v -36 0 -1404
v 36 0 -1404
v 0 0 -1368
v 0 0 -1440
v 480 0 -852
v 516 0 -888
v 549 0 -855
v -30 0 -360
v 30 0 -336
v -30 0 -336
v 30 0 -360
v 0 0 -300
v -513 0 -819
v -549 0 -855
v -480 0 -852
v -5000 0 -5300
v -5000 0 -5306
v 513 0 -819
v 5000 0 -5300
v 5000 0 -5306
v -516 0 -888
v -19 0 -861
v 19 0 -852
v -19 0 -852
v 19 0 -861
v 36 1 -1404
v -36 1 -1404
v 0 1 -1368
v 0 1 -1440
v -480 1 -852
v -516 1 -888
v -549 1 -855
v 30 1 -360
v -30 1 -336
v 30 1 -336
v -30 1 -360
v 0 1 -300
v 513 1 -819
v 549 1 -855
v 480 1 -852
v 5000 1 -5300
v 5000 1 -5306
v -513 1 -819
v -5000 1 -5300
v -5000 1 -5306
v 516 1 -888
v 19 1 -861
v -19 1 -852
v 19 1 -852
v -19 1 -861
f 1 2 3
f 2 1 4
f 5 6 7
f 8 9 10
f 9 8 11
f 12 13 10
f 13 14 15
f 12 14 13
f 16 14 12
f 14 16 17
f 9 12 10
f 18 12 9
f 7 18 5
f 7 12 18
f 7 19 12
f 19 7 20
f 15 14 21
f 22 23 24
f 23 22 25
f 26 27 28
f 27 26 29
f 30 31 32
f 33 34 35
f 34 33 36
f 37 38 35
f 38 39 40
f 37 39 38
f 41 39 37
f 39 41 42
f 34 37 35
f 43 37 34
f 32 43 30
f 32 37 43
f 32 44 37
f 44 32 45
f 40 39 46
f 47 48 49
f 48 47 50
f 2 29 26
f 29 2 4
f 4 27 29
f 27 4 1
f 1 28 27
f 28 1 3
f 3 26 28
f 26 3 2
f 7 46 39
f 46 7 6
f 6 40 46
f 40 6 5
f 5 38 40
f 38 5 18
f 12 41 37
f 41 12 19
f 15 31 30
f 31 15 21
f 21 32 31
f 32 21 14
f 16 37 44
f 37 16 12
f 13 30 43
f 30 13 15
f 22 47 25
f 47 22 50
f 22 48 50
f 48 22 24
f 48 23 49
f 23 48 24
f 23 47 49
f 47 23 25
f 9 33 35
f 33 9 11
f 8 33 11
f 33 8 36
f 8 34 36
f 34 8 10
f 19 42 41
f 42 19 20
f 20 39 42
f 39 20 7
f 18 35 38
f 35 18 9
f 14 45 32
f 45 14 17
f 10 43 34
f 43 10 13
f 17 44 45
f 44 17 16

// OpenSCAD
$fs = 120;

$vpt = [0,1080,480];
$vpr = [-34,0,0];
$vpf = 45;

foul_line = 6;
plain_color = [1,1,1,0.8];
out_color = [1,0.75,0.75,0.8];
eat_color = [0.5,0.75,1,0.8];

// home, first, second, third, rubber
color([1,1,1]) scale([1,-1,-1]) rotate([90,0,0]) linear_extrude(1) {
    polygon([[-30,30*2+300],[30,30*2+300],[30,30+300],[0,300],[-30,30+300]]);
    polygon([[552-36*2,852],[552-36,852+36],[552,852],[552-36,852-36]]);
    polygon([[0,1404+36],[36,1404],[0,1404-36],[-36,1404]]);
    polygon([[-552+36*2,852],[-552+36,852+36],[-552,852],[-552+36,852-36]]);
    polygon([[-19,852],[19,852],[19,9+852],[-19,9+852]]);
}

// foul lines
color([1,1,1,0.5]) scale([1,-1,-1]) rotate([90,0,0]) linear_extrude(1) {
    polygon([[0,300],[-5000,300+5000],[-5000,300+5000+foul_line],[0,300+foul_line]]);
    polygon([[0,300],[5000,300+5000],[5000,300+5000+foul_line],[0,300+foul_line]]);
}

scale([0.1,0.1,-0.1]) translate([-23200,0,0]) {
    color(out_color) polyhedron([[12210,0,14230],[11910,0,22050],[12210,100,14230],[11910,100,22050]], [[0,1,3,2]]);
    color(out_color) polyhedron([[12210,0,14230],[11000,0,14160],[12210,100,14230],[11000,500,14160]], [[0,1,3,2]]);
    color(out_color) polyhedron([[11910,0,22050],[10890,0,22710],[11910,100,22050],[10890,500,22710]], [[0,1,3,2]]);
    color(out_color) polyhedron([[11000,0,14160],[10890,0,22710],[11000,500,14160],[10890,500,22710]], [[0,1,3,2]]);
    color(out_color) polyhedron([[12210,100,14230],[11000,500,14160],[11910,100,22050],[10890,500,22710]], [[0,1,3,2]]);
    color(out_color) polyhedron([[11170,0,19010],[11120,0,21410],[11170,700,19010],[11120,700,21410]], [[0,1,3,2]]);
    color(out_color) polyhedron([[11170,0,19010],[9360,0,19120],[11170,700,19010],[9360,700,19120]], [[0,1,3,2]]);
    color(out_color) polyhedron([[11120,0,21410],[9510,0,21690],[11120,700,21410],[9510,700,21690]], [[0,1,3,2]]);
    color(out_color) polyhedron([[9360,0,19120],[9510,0,21690],[9360,700,19120],[9510,700,21690]], [[0,1,3,2]]);
    color(out_color) polyhedron([[11170,700,19010],[9360,700,19120],[11120,700,21410],[9510,700,21690]], [[0,1,3,2]]);
    color(out_color) polyhedron([[11120,0,21410],[12230,0,25450],[11120,100,21410],[12230,100,25450]], [[0,1,3,2]]);
    color(out_color) polyhedron([[11120,0,21410],[9510,0,21690],[11120,100,21410],[9510,500,21690]], [[0,1,3,2]]);
    color(out_color) polyhedron([[12230,0,25450],[11590,0,26090],[12230,100,25450],[11590,500,26090]], [[0,1,3,2]]);
    color(out_color) polyhedron([[9510,0,21690],[11590,0,26090],[9510,500,21690],[11590,500,26090]], [[0,1,3,2]]);
    color(out_color) polyhedron([[11120,100,21410],[9510,500,21690],[12230,100,25450],[11590,500,26090]], [[0,1,3,2]]);
    color(eat_color) polyhedron([[9630,0,24090],[18040,0,31780],[9630,5,24090],[18040,5,31780]], [[0,1,3,2]]);
    color(eat_color) polyhedron([[9630,0,24090],[7580,0,25450],[9630,5,24090],[7580,5,25450]], [[0,1,3,2]]);
    color(eat_color) polyhedron([[18040,0,31780],[16620,0,34170],[18040,5,31780],[16620,5,34170]], [[0,1,3,2]]);
    color(eat_color) polyhedron([[7580,0,25450],[16620,0,34170],[7580,5,25450],[16620,5,34170]], [[0,1,3,2]]);
    color(eat_color) polyhedron([[9630,5,24090],[7580,5,25450],[18040,5,31780],[16620,5,34170]], [[0,1,3,2]]);
    color(out_color) polyhedron([[8270,0,33280],[17030,0,42150],[8270,10000,33280],[17030,10000,42150]], [[0,1,3,2]]);
    color(out_color) polyhedron([[8270,0,33280],[300,0,41920],[8270,10000,33280],[300,10000,41920]], [[0,1,3,2]]);
    color(out_color) polyhedron([[17030,0,42150],[17030,0,43000],[17030,10000,42150],[17030,10000,43000]], [[0,1,3,2]]);
    color(out_color) polyhedron([[300,0,41920],[17030,0,43000],[300,10000,41920],[17030,10000,43000]], [[0,1,3,2]]);
    color(out_color) polyhedron([[8270,10000,33280],[300,10000,41920],[17030,10000,42150],[17030,10000,43000]], [[0,1,3,2]]);
    color(eat_color) polyhedron([[33670,0,38400],[39560,0,24210],[33670,5,38400],[39560,5,24210]], [[0,1,3,2]]);
    color(eat_color) polyhedron([[33670,0,38400],[37040,0,42380],[33670,5,38400],[37040,5,42380]], [[0,1,3,2]]);
    color(eat_color) polyhedron([[39560,0,24210],[42580,0,32440],[39560,5,24210],[42580,5,32440]], [[0,1,3,2]]);
    color(eat_color) polyhedron([[37040,0,42380],[42580,0,32440],[37040,5,42380],[42580,5,32440]], [[0,1,3,2]]);
    color(eat_color) polyhedron([[33670,5,38400],[37040,5,42380],[39560,5,24210],[42580,5,32440]], [[0,1,3,2]]);
    color(out_color) polyhedron([[35780,0,24940],[37920,0,19780],[35780,500,24940],[37920,500,19780]], [[0,1,3,2]]);
    color(out_color) polyhedron([[35780,0,24940],[38900,0,27150],[35780,500,24940],[38900,1000,27150]], [[0,1,3,2]]);
    color(out_color) polyhedron([[37920,0,19780],[38450,0,23860],[37920,500,19780],[38450,1000,23860]], [[0,1,3,2]]);
    color(out_color) polyhedron([[38900,0,27150],[38450,0,23860],[38900,1000,27150],[38450,1000,23860]], [[0,1,3,2]]);
    color(out_color) polyhedron([[35780,500,24940],[38900,1000,27150],[37920,500,19780],[38450,1000,23860]], [[0,1,3,2]]);
    color(out_color) polyhedron([[28620,0,3330],[29110,0,2760],[28620,500,3330],[29110,500,2760]], [[0,1,3,2]]);
    color(out_color) polyhedron([[28620,0,3330],[32730,0,8510],[28620,500,3330],[32730,1000,8510]], [[0,1,3,2]]);
    color(out_color) polyhedron([[29110,0,2760],[33290,0,6930],[29110,500,2760],[33290,1000,6930]], [[0,1,3,2]]);
    color(out_color) polyhedron([[32730,0,8510],[33290,0,6930],[32730,1000,8510],[33290,1000,6930]], [[0,1,3,2]]);
    color(out_color) polyhedron([[28620,500,3330],[32730,1000,8510],[29110,500,2760],[33290,1000,6930]], [[0,1,3,2]]);
    color(out_color) polyhedron([[28890,0,1880],[29110,0,2760],[28890,5,1880],[29110,5,2760]], [[0,1,3,2]]);
    color(out_color) polyhedron([[28890,0,1880],[28990,0,1880],[28890,5,1880],[28990,5,1880]], [[0,1,3,2]]);
    color(out_color) polyhedron([[29110,0,2760],[29210,0,2760],[29110,5,2760],[29210,5,2760]], [[0,1,3,2]]);
    color(out_color) polyhedron([[28990,0,1880],[29210,0,2760],[28990,5,1880],[29210,5,2760]], [[0,1,3,2]]);
    color(out_color) polyhedron([[28890,5,1880],[28990,5,1880],[29110,5,2760],[29210,5,2760]], [[0,1,3,2]]);
    color(out_color) polyhedron([[13960,0,4590],[18500,0,4590],[13960,5,4590],[18500,5,4590]], [[0,1,3,2]]);
    color(out_color) polyhedron([[13960,0,4590],[13960,0,4690],[13960,5,4590],[13960,5,4690]], [[0,1,3,2]]);
    color(out_color) polyhedron([[18500,0,4590],[18500,0,4690],[18500,5,4590],[18500,5,4690]], [[0,1,3,2]]);
    color(out_color) polyhedron([[13960,0,4690],[18500,0,4690],[13960,5,4690],[18500,5,4690]], [[0,1,3,2]]);
    color(out_color) polyhedron([[13960,5,4590],[13960,5,4690],[18500,5,4590],[18500,5,4690]], [[0,1,3,2]]);
    color(out_color) polyhedron([[19090,0,1880],[19190,0,1880],[19090,5,1880],[19190,5,1880]], [[0,1,3,2]]);
    color(out_color) polyhedron([[19090,0,1880],[18500,0,4560],[19090,5,1880],[18500,5,4560]], [[0,1,3,2]]);
    color(out_color) polyhedron([[19190,0,1880],[18600,0,4560],[19190,5,1880],[18600,5,4560]], [[0,1,3,2]]);
    color(out_color) polyhedron([[18500,0,4560],[18600,0,4560],[18500,5,4560],[18600,5,4560]], [[0,1,3,2]]);
    color(out_color) polyhedron([[19090,5,1880],[18500,5,4560],[19190,5,1880],[18600,5,4560]], [[0,1,3,2]]);
    color(out_color) polyhedron([[10420,0,14090],[11000,0,14160],[10420,5,14090],[11000,5,14160]], [[0,1,3,2]]);
    color(out_color) polyhedron([[10420,0,14090],[10420,0,14190],[10420,5,14090],[10420,5,14190]], [[0,1,3,2]]);
    color(out_color) polyhedron([[11000,0,14160],[11000,0,14260],[11000,5,14160],[11000,5,14260]], [[0,1,3,2]]);
    color(out_color) polyhedron([[10420,0,14190],[11000,0,14260],[10420,5,14190],[11000,5,14260]], [[0,1,3,2]]);
    color(out_color) polyhedron([[10420,5,14090],[10420,5,14190],[11000,5,14160],[11000,5,14260]], [[0,1,3,2]]);
    color(out_color) polyhedron([[18040,0,31780],[28960,0,42380],[18040,5,31780],[28960,5,42380]], [[0,1,3,2]]);
    color(out_color) polyhedron([[18040,0,31780],[18040,0,31880],[18040,5,31780],[18040,5,31880]], [[0,1,3,2]]);
    color(out_color) polyhedron([[28960,0,42380],[28960,0,42480],[28960,5,42380],[28960,5,42480]], [[0,1,3,2]]);
    color(out_color) polyhedron([[18040,0,31880],[28960,0,42480],[18040,5,31880],[28960,5,42480]], [[0,1,3,2]]);
    color(out_color) polyhedron([[18040,5,31780],[18040,5,31880],[28960,5,42380],[28960,5,42480]], [[0,1,3,2]]);
    color(out_color) polyhedron([[28960,0,42380],[33670,0,38400],[28960,5,42380],[33670,5,38400]], [[0,1,3,2]]);
    color(out_color) polyhedron([[28960,0,42380],[28960,0,42480],[28960,5,42380],[28960,5,42480]], [[0,1,3,2]]);
    color(out_color) polyhedron([[33670,0,38400],[33670,0,38500],[33670,5,38400],[33670,5,38500]], [[0,1,3,2]]);
    color(out_color) polyhedron([[28960,0,42480],[33670,0,38500],[28960,5,42480],[33670,5,38500]], [[0,1,3,2]]);
    color(out_color) polyhedron([[28960,5,42380],[28960,5,42480],[33670,5,38400],[33670,5,38500]], [[0,1,3,2]]);
    color(plain_color) polyhedron([[0,0,0],[0,0,0],[0,0,0],[0,0,0]], [[0,1,3,2]]);
    color(plain_color) polyhedron([[0,0,0],[0,0,0],[0,0,0],[0,0,0]], [[0,1,3,2]]);
    color(plain_color) polyhedron([[0,0,0],[0,0,0],[0,0,0],[0,0,0]], [[0,1,3,2]]);
    color(plain_color) polyhedron([[0,0,0],[0,0,0],[0,0,0],[0,0,0]], [[0,1,3,2]]);
    color(plain_color) polyhedron([[0,0,0],[0,0,0],[0,0,0],[0,0,0]], [[0,1,3,2]]);
    color(plain_color) polyhedron([[0,0,0],[0,0,0],[0,0,0],[0,0,0]], [[0,1,3,2]]);
    color(plain_color) polyhedron([[0,0,0],[0,0,0],[0,0,0],[0,0,0]], [[0,1,3,2]]);
    color(plain_color) polyhedron([[0,0,0],[0,0,0],[0,0,0],[0,0,0]], [[0,1,3,2]]);
    color(plain_color) polyhedron([[0,0,0],[0,0,0],[0,0,0],[0,0,0]], [[0,1,3,2]]);
    color(plain_color) polyhedron([[0,0,0],[0,0,0],[0,0,0],[0,0,0]], [[0,1,3,2]]);
    color(plain_color) polyhedron([[0,0,0],[0,0,0],[0,0,0],[0,0,0]], [[0,1,3,2]]);
    color(plain_color) polyhedron([[0,0,0],[0,0,0],[0,0,0],[0,0,0]], [[0,1,3,2]]);
    color(plain_color) polyhedron([[0,0,0],[0,0,0],[0,0,0],[0,0,0]], [[0,1,3,2]]);
    color(plain_color) polyhedron([[0,0,0],[0,0,0],[0,0,0],[0,0,0]], [[0,1,3,2]]);
    color(plain_color) polyhedron([[0,0,0],[0,0,0],[0,0,0],[0,0,0]], [[0,1,3,2]]);
    color(plain_color) polyhedron([[0,0,0],[0,0,0],[0,0,0],[0,0,0]], [[0,1,3,2]]);
    color(plain_color) polyhedron([[0,0,0],[0,0,0],[0,0,0],[0,0,0]], [[0,1,3,2]]);
    color(plain_color) polyhedron([[0,0,0],[0,0,0],[0,0,0],[0,0,0]], [[0,1,3,2]]);
    color(plain_color) polyhedron([[0,0,0],[0,0,0],[0,0,0],[0,0,0]], [[0,1,3,2]]);
    color(plain_color) polyhedron([[0,0,0],[0,0,0],[0,0,0],[0,0,0]], [[0,1,3,2]]);
    color(plain_color) polyhedron([[0,0,0],[0,0,0],[0,0,0],[0,0,0]], [[0,1,3,2]]);
    color(plain_color) polyhedron([[0,0,0],[0,0,0],[0,0,0],[0,0,0]], [[0,1,3,2]]);
    color(plain_color) polyhedron([[0,0,0],[0,0,0],[0,0,0],[0,0,0]], [[0,1,3,2]]);
    color(plain_color) polyhedron([[0,0,0],[0,0,0],[0,0,0],[0,0,0]], [[0,1,3,2]]);
    color(plain_color) polyhedron([[0,0,0],[0,0,0],[0,0,0],[0,0,0]], [[0,1,3,2]]);
    color(plain_color) polyhedron([[0,0,0],[0,0,0],[0,0,0],[0,0,0]], [[0,1,3,2]]);
    color(plain_color) polyhedron([[0,0,0],[0,0,0],[0,0,0],[0,0,0]], [[0,1,3,2]]);
    color(plain_color) polyhedron([[0,0,0],[0,0,0],[0,0,0],[0,0,0]], [[0,1,3,2]]);
    color(plain_color) polyhedron([[0,0,0],[0,0,0],[0,0,0],[0,0,0]], [[0,1,3,2]]);
    color(plain_color) polyhedron([[0,0,0],[0,0,0],[0,0,0],[0,0,0]], [[0,1,3,2]]);
    color(plain_color) polyhedron([[0,0,0],[0,0,0],[0,0,0],[0,0,0]], [[0,1,3,2]]);
    color(plain_color) polyhedron([[0,0,0],[0,0,0],[0,0,0],[0,0,0]], [[0,1,3,2]]);
    color(plain_color) polyhedron([[0,0,0],[0,0,0],[0,0,0],[0,0,0]], [[0,1,3,2]]);
    color(plain_color) polyhedron([[0,0,0],[0,0,0],[0,0,0],[0,0,0]], [[0,1,3,2]]);
    color(plain_color) polyhedron([[0,0,0],[0,0,0],[0,0,0],[0,0,0]], [[0,1,3,2]]);
    color(plain_color) polyhedron([[0,0,0],[0,0,0],[0,0,0],[0,0,0]], [[0,1,3,2]]);
    color(plain_color) polyhedron([[0,0,0],[0,0,0],[0,0,0],[0,0,0]], [[0,1,3,2]]);
    color(plain_color) polyhedron([[0,0,0],[0,0,0],[0,0,0],[0,0,0]], [[0,1,3,2]]);
    color(plain_color) polyhedron([[0,0,0],[0,0,0],[0,0,0],[0,0,0]], [[0,1,3,2]]);
    color(plain_color) polyhedron([[0,0,0],[0,0,0],[0,0,0],[0,0,0]], [[0,1,3,2]]);
    color(plain_color) polyhedron([[0,0,0],[0,0,0],[0,0,0],[0,0,0]], [[0,1,3,2]]);
    color(plain_color) polyhedron([[0,0,0],[0,0,0],[0,0,0],[0,0,0]], [[0,1,3,2]]);
    color(plain_color) polyhedron([[0,0,0],[0,0,0],[0,0,0],[0,0,0]], [[0,1,3,2]]);
    color(plain_color) polyhedron([[0,0,0],[0,0,0],[0,0,0],[0,0,0]], [[0,1,3,2]]);
    color(plain_color) polyhedron([[0,0,0],[0,0,0],[0,0,0],[0,0,0]], [[0,1,3,2]]);
    color(plain_color) polyhedron([[0,0,0],[0,0,0],[0,0,0],[0,0,0]], [[0,1,3,2]]);
    color(plain_color) polyhedron([[0,0,0],[0,0,0],[0,0,0],[0,0,0]], [[0,1,3,2]]);
    color(plain_color) polyhedron([[0,0,0],[0,0,0],[0,0,0],[0,0,0]], [[0,1,3,2]]);
    color(plain_color) polyhedron([[0,0,0],[0,0,0],[0,0,0],[0,0,0]], [[0,1,3,2]]);
    color(plain_color) polyhedron([[0,0,0],[0,0,0],[0,0,0],[0,0,0]], [[0,1,3,2]]);
    color(plain_color) polyhedron([[0,0,0],[0,0,0],[0,0,0],[0,0,0]], [[0,1,3,2]]);
    color(plain_color) polyhedron([[0,0,0],[0,0,0],[0,0,0],[0,0,0]], [[0,1,3,2]]);
    color(plain_color) polyhedron([[0,0,0],[0,0,0],[0,0,0],[0,0,0]], [[0,1,3,2]]);
    color(plain_color) polyhedron([[0,0,0],[0,0,0],[0,0,0],[0,0,0]], [[0,1,3,2]]);
    color(plain_color) polyhedron([[0,0,0],[0,0,0],[0,0,0],[0,0,0]], [[0,1,3,2]]);
    color(plain_color) polyhedron([[0,0,0],[0,0,0],[0,0,0],[0,0,0]], [[0,1,3,2]]);
    color(plain_color) polyhedron([[0,0,0],[0,0,0],[0,0,0],[0,0,0]], [[0,1,3,2]]);
    color(plain_color) polyhedron([[0,0,0],[0,0,0],[0,0,0],[0,0,0]], [[0,1,3,2]]);
    color(plain_color) polyhedron([[0,0,0],[0,0,0],[0,0,0],[0,0,0]], [[0,1,3,2]]);
    color(plain_color) polyhedron([[0,0,0],[0,0,0],[0,0,0],[0,0,0]], [[0,1,3,2]]);
    color(plain_color) polyhedron([[0,0,0],[0,0,0],[0,0,0],[0,0,0]], [[0,1,3,2]]);
    color(plain_color) polyhedron([[0,0,0],[0,0,0],[0,0,0],[0,0,0]], [[0,1,3,2]]);
    color(plain_color) polyhedron([[0,0,0],[0,0,0],[0,0,0],[0,0,0]], [[0,1,3,2]]);
    color(plain_color) polyhedron([[0,0,0],[0,0,0],[0,0,0],[0,0,0]], [[0,1,3,2]]);
    color(plain_color) polyhedron([[0,0,0],[0,0,0],[0,0,0],[0,0,0]], [[0,1,3,2]]);
    color(plain_color) polyhedron([[0,0,0],[0,0,0],[0,0,0],[0,0,0]], [[0,1,3,2]]);
    color(plain_color) polyhedron([[0,0,0],[0,0,0],[0,0,0],[0,0,0]], [[0,1,3,2]]);
    color(plain_color) polyhedron([[0,0,0],[0,0,0],[0,0,0],[0,0,0]], [[0,1,3,2]]);
    color(plain_color) polyhedron([[0,0,0],[0,0,0],[0,0,0],[0,0,0]], [[0,1,3,2]]);
    color(plain_color) polyhedron([[0,0,0],[0,0,0],[0,0,0],[0,0,0]], [[0,1,3,2]]);
    color(plain_color) polyhedron([[0,0,0],[0,0,0],[0,0,0],[0,0,0]], [[0,1,3,2]]);
    color(plain_color) polyhedron([[0,0,0],[0,0,0],[0,0,0],[0,0,0]], [[0,1,3,2]]);
    color(plain_color) polyhedron([[0,0,0],[0,0,0],[0,0,0],[0,0,0]], [[0,1,3,2]]);
    color(plain_color) polyhedron([[0,0,0],[0,0,0],[0,0,0],[0,0,0]], [[0,1,3,2]]);
    color(plain_color) polyhedron([[0,0,0],[0,0,0],[0,0,0],[0,0,0]], [[0,1,3,2]]);
    color(plain_color) polyhedron([[0,0,0],[0,0,0],[0,0,0],[0,0,0]], [[0,1,3,2]]);
    color(plain_color) polyhedron([[0,0,0],[0,0,0],[0,0,0],[0,0,0]], [[0,1,3,2]]);
    color(plain_color) polyhedron([[0,0,0],[0,0,0],[0,0,0],[0,0,0]], [[0,1,3,2]]);
    color(plain_color) polyhedron([[0,0,0],[0,0,0],[0,0,0],[0,0,0]], [[0,1,3,2]]);
    color(plain_color) polyhedron([[0,0,0],[0,0,0],[0,0,0],[0,0,0]], [[0,1,3,2]]);
    color(plain_color) polyhedron([[0,0,0],[0,0,0],[0,0,0],[0,0,0]], [[0,1,3,2]]);
    color(plain_color) polyhedron([[0,0,0],[0,0,0],[0,0,0],[0,0,0]], [[0,1,3,2]]);
    color(plain_color) polyhedron([[0,0,0],[0,0,0],[0,0,0],[0,0,0]], [[0,1,3,2]]);
    color(plain_color) polyhedron([[0,0,0],[0,0,0],[0,0,0],[0,0,0]], [[0,1,3,2]]);
    color(plain_color) polyhedron([[0,0,0],[0,0,0],[0,0,0],[0,0,0]], [[0,1,3,2]]);
    color(plain_color) polyhedron([[0,0,0],[0,0,0],[0,0,0],[0,0,0]], [[0,1,3,2]]);
    color(plain_color) polyhedron([[0,0,0],[0,0,0],[0,0,0],[0,0,0]], [[0,1,3,2]]);
    color(plain_color) polyhedron([[0,0,0],[0,0,0],[0,0,0],[0,0,0]], [[0,1,3,2]]);
    color(plain_color) polyhedron([[0,0,0],[0,0,0],[0,0,0],[0,0,0]], [[0,1,3,2]]);
    color(plain_color) polyhedron([[0,0,0],[0,0,0],[0,0,0],[0,0,0]], [[0,1,3,2]]);
    color(plain_color) polyhedron([[0,0,0],[0,0,0],[0,0,0],[0,0,0]], [[0,1,3,2]]);
    color(plain_color) polyhedron([[0,0,0],[0,0,0],[0,0,0],[0,0,0]], [[0,1,3,2]]);
    color(plain_color) polyhedron([[0,0,0],[0,0,0],[0,0,0],[0,0,0]], [[0,1,3,2]]);
    color(plain_color) polyhedron([[0,0,0],[0,0,0],[0,0,0],[0,0,0]], [[0,1,3,2]]);
    color(plain_color) polyhedron([[0,0,0],[0,0,0],[0,0,0],[0,0,0]], [[0,1,3,2]]);
    color(plain_color) polyhedron([[0,0,0],[0,0,0],[0,0,0],[0,0,0]], [[0,1,3,2]]);
    color(plain_color) polyhedron([[0,0,0],[0,0,0],[0,0,0],[0,0,0]], [[0,1,3,2]]);
    color(plain_color) polyhedron([[0,0,0],[0,0,0],[0,0,0],[0,0,0]], [[0,1,3,2]]);
    color(plain_color) polyhedron([[0,0,0],[0,0,0],[0,0,0],[0,0,0]], [[0,1,3,2]]);
    color(plain_color) polyhedron([[0,0,0],[0,0,0],[0,0,0],[0,0,0]], [[0,1,3,2]]);
    color(plain_color) polyhedron([[0,0,0],[0,0,0],[0,0,0],[0,0,0]], [[0,1,3,2]]);
    color(plain_color) polyhedron([[0,0,0],[0,0,0],[0,0,0],[0,0,0]], [[0,1,3,2]]);
    color(plain_color) polyhedron([[0,0,0],[0,0,0],[0,0,0],[0,0,0]], [[0,1,3,2]]);
    color(plain_color) polyhedron([[0,0,0],[0,0,0],[0,0,0],[0,0,0]], [[0,1,3,2]]);
    color(plain_color) polyhedron([[0,0,0],[0,0,0],[0,0,0],[0,0,0]], [[0,1,3,2]]);
    color(plain_color) polyhedron([[0,0,0],[0,0,0],[0,0,0],[0,0,0]], [[0,1,3,2]]);
    color(plain_color) polyhedron([[0,0,0],[0,0,0],[0,0,0],[0,0,0]], [[0,1,3,2]]);
    color(plain_color) polyhedron([[0,0,0],[0,0,0],[0,0,0],[0,0,0]], [[0,1,3,2]]);
    color(plain_color) polyhedron([[0,0,0],[0,0,0],[0,0,0],[0,0,0]], [[0,1,3,2]]);
    color(plain_color) polyhedron([[0,0,0],[0,0,0],[0,0,0],[0,0,0]], [[0,1,3,2]]);
    color(plain_color) polyhedron([[0,0,0],[0,0,0],[0,0,0],[0,0,0]], [[0,1,3,2]]);
    color(plain_color) polyhedron([[0,0,0],[0,0,0],[0,0,0],[0,0,0]], [[0,1,3,2]]);
    color(plain_color) polyhedron([[0,0,0],[0,0,0],[0,0,0],[0,0,0]], [[0,1,3,2]]);
    color(plain_color) polyhedron([[0,0,0],[0,0,0],[0,0,0],[0,0,0]], [[0,1,3,2]]);
    color(plain_color) polyhedron([[0,0,0],[0,0,0],[0,0,0],[0,0,0]], [[0,1,3,2]]);
    color(plain_color) polyhedron([[0,0,0],[0,0,0],[0,0,0],[0,0,0]], [[0,1,3,2]]);
    color(plain_color) polyhedron([[0,0,0],[0,0,0],[0,0,0],[0,0,0]], [[0,1,3,2]]);
    color(plain_color) polyhedron([[0,0,0],[0,0,0],[0,0,0],[0,0,0]], [[0,1,3,2]]);
    color(plain_color) polyhedron([[0,0,0],[0,0,0],[0,0,0],[0,0,0]], [[0,1,3,2]]);
    color(plain_color) polyhedron([[0,0,0],[0,0,0],[0,0,0],[0,0,0]], [[0,1,3,2]]);
    color(plain_color) polyhedron([[0,0,0],[0,0,0],[0,0,0],[0,0,0]], [[0,1,3,2]]);
    color(plain_color) polyhedron([[0,0,0],[0,0,0],[0,0,0],[0,0,0]], [[0,1,3,2]]);
    color(plain_color) polyhedron([[0,0,0],[0,0,0],[0,0,0],[0,0,0]], [[0,1,3,2]]);
    color(plain_color) polyhedron([[0,0,0],[0,0,0],[0,0,0],[0,0,0]], [[0,1,3,2]]);
    color(plain_color) polyhedron([[0,0,0],[0,0,0],[0,0,0],[0,0,0]], [[0,1,3,2]]);
    color(plain_color) polyhedron([[0,0,0],[0,0,0],[0,0,0],[0,0,0]], [[0,1,3,2]]);
    color(plain_color) polyhedron([[0,0,0],[0,0,0],[0,0,0],[0,0,0]], [[0,1,3,2]]);
    color(plain_color) polyhedron([[0,0,0],[0,0,0],[0,0,0],[0,0,0]], [[0,1,3,2]]);
    color(plain_color) polyhedron([[0,0,0],[0,0,0],[0,0,0],[0,0,0]], [[0,1,3,2]]);
    color(plain_color) polyhedron([[0,0,0],[0,0,0],[0,0,0],[0,0,0]], [[0,1,3,2]]);
    color(plain_color) polyhedron([[0,0,0],[0,0,0],[0,0,0],[0,0,0]], [[0,1,3,2]]);
    color(plain_color) polyhedron([[0,0,0],[0,0,0],[0,0,0],[0,0,0]], [[0,1,3,2]]);
    color(plain_color) polyhedron([[0,0,0],[0,0,0],[0,0,0],[0,0,0]], [[0,1,3,2]]);
    color(plain_color) polyhedron([[0,0,0],[0,0,0],[0,0,0],[0,0,0]], [[0,1,3,2]]);
    color(plain_color) polyhedron([[0,0,0],[0,0,0],[0,0,0],[0,0,0]], [[0,1,3,2]]);
    color(plain_color) polyhedron([[0,0,0],[0,0,0],[0,0,0],[0,0,0]], [[0,1,3,2]]);
    color(plain_color) polyhedron([[0,0,0],[0,0,0],[0,0,0],[0,0,0]], [[0,1,3,2]]);
    color(plain_color) polyhedron([[0,0,0],[0,0,0],[0,0,0],[0,0,0]], [[0,1,3,2]]);
    color(plain_color) polyhedron([[0,0,0],[0,0,0],[0,0,0],[0,0,0]], [[0,1,3,2]]);
    color(plain_color) polyhedron([[0,0,0],[0,0,0],[0,0,0],[0,0,0]], [[0,1,3,2]]);
    color(plain_color) polyhedron([[0,0,0],[0,0,0],[0,0,0],[0,0,0]], [[0,1,3,2]]);
    color(plain_color) polyhedron([[0,0,0],[0,0,0],[0,0,0],[0,0,0]], [[0,1,3,2]]);
    color(plain_color) polyhedron([[0,0,0],[0,0,0],[0,0,0],[0,0,0]], [[0,1,3,2]]);
    color(plain_color) polyhedron([[0,0,0],[0,0,0],[0,0,0],[0,0,0]], [[0,1,3,2]]);
    color(plain_color) polyhedron([[0,0,0],[0,0,0],[0,0,0],[0,0,0]], [[0,1,3,2]]);
    color(plain_color) polyhedron([[0,0,0],[0,0,0],[0,0,0],[0,0,0]], [[0,1,3,2]]);
    color(plain_color) polyhedron([[0,0,0],[0,0,0],[0,0,0],[0,0,0]], [[0,1,3,2]]);
    color(plain_color) polyhedron([[0,0,0],[0,0,0],[0,0,0],[0,0,0]], [[0,1,3,2]]);
    color(plain_color) polyhedron([[0,0,0],[0,0,0],[0,0,0],[0,0,0]], [[0,1,3,2]]);
    color(plain_color) polyhedron([[0,0,0],[0,0,0],[0,0,0],[0,0,0]], [[0,1,3,2]]);
    color(plain_color) polyhedron([[0,0,0],[0,0,0],[0,0,0],[0,0,0]], [[0,1,3,2]]);
    color(plain_color) polyhedron([[0,0,0],[0,0,0],[0,0,0],[0,0,0]], [[0,1,3,2]]);
    color(plain_color) polyhedron([[0,0,0],[0,0,0],[0,0,0],[0,0,0]], [[0,1,3,2]]);
    color(plain_color) polyhedron([[0,0,0],[0,0,0],[0,0,0],[0,0,0]], [[0,1,3,2]]);
    color(plain_color) polyhedron([[0,0,0],[0,0,0],[0,0,0],[0,0,0]], [[0,1,3,2]]);
    color(plain_color) polyhedron([[0,0,0],[0,0,0],[0,0,0],[0,0,0]], [[0,1,3,2]]);
    color(plain_color) polyhedron([[0,0,0],[0,0,0],[0,0,0],[0,0,0]], [[0,1,3,2]]);
    color(plain_color) polyhedron([[0,0,0],[0,0,0],[0,0,0],[0,0,0]], [[0,1,3,2]]);
    color(plain_color) polyhedron([[0,0,0],[0,0,0],[0,0,0],[0,0,0]], [[0,1,3,2]]);
    color(plain_color) polyhedron([[0,0,0],[0,0,0],[0,0,0],[0,0,0]], [[0,1,3,2]]);
    color(plain_color) polyhedron([[0,0,0],[0,0,0],[0,0,0],[0,0,0]], [[0,1,3,2]]);
    color(plain_color) polyhedron([[0,0,0],[0,0,0],[0,0,0],[0,0,0]], [[0,1,3,2]]);
    color(plain_color) polyhedron([[0,0,0],[0,0,0],[0,0,0],[0,0,0]], [[0,1,3,2]]);
    color(plain_color) polyhedron([[0,0,0],[0,0,0],[0,0,0],[0,0,0]], [[0,1,3,2]]);
    color(plain_color) polyhedron([[0,0,0],[0,0,0],[0,0,0],[0,0,0]], [[0,1,3,2]]);
    color(plain_color) polyhedron([[0,0,0],[0,0,0],[0,0,0],[0,0,0]], [[0,1,3,2]]);
    color(plain_color) polyhedron([[0,0,0],[0,0,0],[0,0,0],[0,0,0]], [[0,1,3,2]]);
    color(plain_color) polyhedron([[0,0,0],[0,0,0],[0,0,0],[0,0,0]], [[0,1,3,2]]);
    color(plain_color) polyhedron([[0,0,0],[0,0,0],[0,0,0],[0,0,0]], [[0,1,3,2]]);
    color(plain_color) polyhedron([[0,0,0],[0,0,0],[0,0,0],[0,0,0]], [[0,1,3,2]]);
    color(plain_color) polyhedron([[0,0,0],[0,0,0],[0,0,0],[0,0,0]], [[0,1,3,2]]);
    color(plain_color) polyhedron([[0,0,0],[0,0,0],[0,0,0],[0,0,0]], [[0,1,3,2]]);
    color(plain_color) polyhedron([[0,0,0],[0,0,0],[0,0,0],[0,0,0]], [[0,1,3,2]]);
    color(plain_color) polyhedron([[0,0,0],[0,0,0],[0,0,0],[0,0,0]], [[0,1,3,2]]);
    color(plain_color) polyhedron([[0,0,0],[0,0,0],[0,0,0],[0,0,0]], [[0,1,3,2]]);
    color(plain_color) polyhedron([[0,0,0],[0,0,0],[0,0,0],[0,0,0]], [[0,1,3,2]]);
    color(plain_color) polyhedron([[0,0,0],[0,0,0],[0,0,0],[0,0,0]], [[0,1,3,2]]);
    color(plain_color) polyhedron([[0,0,0],[0,0,0],[0,0,0],[0,0,0]], [[0,1,3,2]]);
    color(plain_color) polyhedron([[0,0,0],[0,0,0],[0,0,0],[0,0,0]], [[0,1,3,2]]);
    color(plain_color) polyhedron([[0,0,0],[0,0,0],[0,0,0],[0,0,0]], [[0,1,3,2]]);
    color(plain_color) polyhedron([[0,0,0],[0,0,0],[0,0,0],[0,0,0]], [[0,1,3,2]]);
    color(plain_color) polyhedron([[0,0,0],[0,0,0],[0,0,0],[0,0,0]], [[0,1,3,2]]);
    color(plain_color) polyhedron([[0,0,0],[0,0,0],[0,0,0],[0,0,0]], [[0,1,3,2]]);
    color(plain_color) polyhedron([[0,0,0],[0,0,0],[0,0,0],[0,0,0]], [[0,1,3,2]]);
    color(plain_color) polyhedron([[0,0,0],[0,0,0],[0,0,0],[0,0,0]], [[0,1,3,2]]);
    color(plain_color) polyhedron([[0,0,0],[0,0,0],[0,0,0],[0,0,0]], [[0,1,3,2]]);
    color(plain_color) polyhedron([[0,0,0],[0,0,0],[0,0,0],[0,0,0]], [[0,1,3,2]]);
    color(plain_color) polyhedron([[0,0,0],[0,0,0],[0,0,0],[0,0,0]], [[0,1,3,2]]);
    color(plain_color) polyhedron([[0,0,0],[0,0,0],[0,0,0],[0,0,0]], [[0,1,3,2]]);
    color(plain_color) polyhedron([[0,0,0],[0,0,0],[0,0,0],[0,0,0]], [[0,1,3,2]]);
    color(plain_color) polyhedron([[0,0,0],[0,0,0],[0,0,0],[0,0,0]], [[0,1,3,2]]);
    color(plain_color) polyhedron([[0,0,0],[0,0,0],[0,0,0],[0,0,0]], [[0,1,3,2]]);
    color(plain_color) polyhedron([[0,0,0],[0,0,0],[0,0,0],[0,0,0]], [[0,1,3,2]]);
    color(plain_color) polyhedron([[0,0,0],[0,0,0],[0,0,0],[0,0,0]], [[0,1,3,2]]);
    color(plain_color) polyhedron([[0,0,0],[0,0,0],[0,0,0],[0,0,0]], [[0,1,3,2]]);
    color(plain_color) polyhedron([[0,0,0],[0,0,0],[0,0,0],[0,0,0]], [[0,1,3,2]]);
    color(plain_color) polyhedron([[0,0,0],[0,0,0],[0,0,0],[0,0,0]], [[0,1,3,2]]);
    color(plain_color) polyhedron([[0,0,0],[0,0,0],[0,0,0],[0,0,0]], [[0,1,3,2]]);
    color(plain_color) polyhedron([[0,0,0],[0,0,0],[0,0,0],[0,0,0]], [[0,1,3,2]]);
    color(plain_color) polyhedron([[0,0,0],[0,0,0],[0,0,0],[0,0,0]], [[0,1,3,2]]);
    color(plain_color) polyhedron([[0,0,0],[0,0,0],[0,0,0],[0,0,0]], [[0,1,3,2]]);
    color(plain_color) polyhedron([[0,0,0],[0,0,0],[0,0,0],[0,0,0]], [[0,1,3,2]]);
    color(plain_color) polyhedron([[0,0,0],[0,0,0],[0,0,0],[0,0,0]], [[0,1,3,2]]);
    color(plain_color) polyhedron([[0,0,0],[0,0,0],[0,0,0],[0,0,0]], [[0,1,3,2]]);
    color(plain_color) polyhedron([[0,0,0],[0,0,0],[0,0,0],[0,0,0]], [[0,1,3,2]]);
    color(plain_color) polyhedron([[0,0,0],[0,0,0],[0,0,0],[0,0,0]], [[0,1,3,2]]);
    color(plain_color) polyhedron([[0,0,0],[0,0,0],[0,0,0],[0,0,0]], [[0,1,3,2]]);
    color(plain_color) polyhedron([[0,0,0],[0,0,0],[0,0,0],[0,0,0]], [[0,1,3,2]]);
    color(plain_color) polyhedron([[0,0,0],[0,0,0],[0,0,0],[0,0,0]], [[0,1,3,2]]);
    color(plain_color) polyhedron([[0,0,0],[0,0,0],[0,0,0],[0,0,0]], [[0,1,3,2]]);
    color(plain_color) polyhedron([[0,0,0],[0,0,0],[0,0,0],[0,0,0]], [[0,1,3,2]]);
    color(plain_color) polyhedron([[0,0,0],[0,0,0],[0,0,0],[0,0,0]], [[0,1,3,2]]);
    color(plain_color) polyhedron([[0,0,0],[0,0,0],[0,0,0],[0,0,0]], [[0,1,3,2]]);
    color(plain_color) polyhedron([[0,0,0],[0,0,0],[0,0,0],[0,0,0]], [[0,1,3,2]]);
    color(plain_color) polyhedron([[0,0,0],[0,0,0],[0,0,0],[0,0,0]], [[0,1,3,2]]);
    color(plain_color) polyhedron([[0,0,0],[0,0,0],[0,0,0],[0,0,0]], [[0,1,3,2]]);
    color(plain_color) polyhedron([[0,0,0],[0,0,0],[0,0,0],[0,0,0]], [[0,1,3,2]]);
    color(plain_color) polyhedron([[0,0,0],[0,0,0],[0,0,0],[0,0,0]], [[0,1,3,2]]);
    color(plain_color) polyhedron([[0,0,0],[0,0,0],[0,0,0],[0,0,0]], [[0,1,3,2]]);
    color(plain_color) polyhedron([[0,0,0],[0,0,0],[0,0,0],[0,0,0]], [[0,1,3,2]]);
    color(plain_color) polyhedron([[0,0,0],[0,0,0],[0,0,0],[0,0,0]], [[0,1,3,2]]);
    color(plain_color) polyhedron([[0,0,0],[0,0,0],[0,0,0],[0,0,0]], [[0,1,3,2]]);
    color(plain_color) polyhedron([[0,0,0],[0,0,0],[0,0,0],[0,0,0]], [[0,1,3,2]]);
    color(plain_color) polyhedron([[0,0,0],[0,0,0],[0,0,0],[0,0,0]], [[0,1,3,2]]);
    color(plain_color) polyhedron([[0,0,0],[0,0,0],[0,0,0],[0,0,0]], [[0,1,3,2]]);
    color(plain_color) polyhedron([[0,0,0],[0,0,0],[0,0,0],[0,0,0]], [[0,1,3,2]]);
    color(plain_color) polyhedron([[0,0,0],[0,0,0],[0,0,0],[0,0,0]], [[0,1,3,2]]);
    color(plain_color) polyhedron([[0,0,0],[0,0,0],[0,0,0],[0,0,0]], [[0,1,3,2]]);
    color(plain_color) polyhedron([[0,0,0],[0,0,0],[0,0,0],[0,0,0]], [[0,1,3,2]]);
    color(plain_color) polyhedron([[0,0,0],[0,0,0],[0,0,0],[0,0,0]], [[0,1,3,2]]);
    color(plain_color) polyhedron([[0,0,0],[0,0,0],[0,0,0],[0,0,0]], [[0,1,3,2]]);
    color(plain_color) polyhedron([[0,0,0],[0,0,0],[0,0,0],[0,0,0]], [[0,1,3,2]]);
    color(plain_color) polyhedron([[0,0,0],[0,0,0],[0,0,0],[0,0,0]], [[0,1,3,2]]);
    color(plain_color) polyhedron([[0,0,0],[0,0,0],[0,0,0],[0,0,0]], [[0,1,3,2]]);
    color(plain_color) polyhedron([[0,0,0],[0,0,0],[0,0,0],[0,0,0]], [[0,1,3,2]]);
    color(plain_color) polyhedron([[0,0,0],[0,0,0],[0,0,0],[0,0,0]], [[0,1,3,2]]);
    color(plain_color) polyhedron([[0,0,0],[0,0,0],[0,0,0],[0,0,0]], [[0,1,3,2]]);
    color(plain_color) polyhedron([[0,0,0],[0,0,0],[0,0,0],[0,0,0]], [[0,1,3,2]]);
    color(plain_color) polyhedron([[0,0,0],[0,0,0],[0,0,0],[0,0,0]], [[0,1,3,2]]);
    color(plain_color) polyhedron([[0,0,0],[0,0,0],[0,0,0],[0,0,0]], [[0,1,3,2]]);
    color(plain_color) polyhedron([[0,0,0],[0,0,0],[0,0,0],[0,0,0]], [[0,1,3,2]]);
    color(plain_color) polyhedron([[0,0,0],[0,0,0],[0,0,0],[0,0,0]], [[0,1,3,2]]);
    color(plain_color) polyhedron([[0,0,0],[0,0,0],[0,0,0],[0,0,0]], [[0,1,3,2]]);
    color(plain_color) polyhedron([[0,0,0],[0,0,0],[0,0,0],[0,0,0]], [[0,1,3,2]]);
    color(plain_color) polyhedron([[0,0,0],[0,0,0],[0,0,0],[0,0,0]], [[0,1,3,2]]);
    color(plain_color) polyhedron([[0,0,0],[0,0,0],[0,0,0],[0,0,0]], [[0,1,3,2]]);
    color(plain_color) polyhedron([[0,0,0],[0,0,0],[0,0,0],[0,0,0]], [[0,1,3,2]]);
    color(plain_color) polyhedron([[0,0,0],[0,0,0],[0,0,0],[0,0,0]], [[0,1,3,2]]);
    color(plain_color) polyhedron([[0,0,0],[0,0,0],[0,0,0],[0,0,0]], [[0,1,3,2]]);
    color(plain_color) polyhedron([[0,0,0],[0,0,0],[0,0,0],[0,0,0]], [[0,1,3,2]]);
}
